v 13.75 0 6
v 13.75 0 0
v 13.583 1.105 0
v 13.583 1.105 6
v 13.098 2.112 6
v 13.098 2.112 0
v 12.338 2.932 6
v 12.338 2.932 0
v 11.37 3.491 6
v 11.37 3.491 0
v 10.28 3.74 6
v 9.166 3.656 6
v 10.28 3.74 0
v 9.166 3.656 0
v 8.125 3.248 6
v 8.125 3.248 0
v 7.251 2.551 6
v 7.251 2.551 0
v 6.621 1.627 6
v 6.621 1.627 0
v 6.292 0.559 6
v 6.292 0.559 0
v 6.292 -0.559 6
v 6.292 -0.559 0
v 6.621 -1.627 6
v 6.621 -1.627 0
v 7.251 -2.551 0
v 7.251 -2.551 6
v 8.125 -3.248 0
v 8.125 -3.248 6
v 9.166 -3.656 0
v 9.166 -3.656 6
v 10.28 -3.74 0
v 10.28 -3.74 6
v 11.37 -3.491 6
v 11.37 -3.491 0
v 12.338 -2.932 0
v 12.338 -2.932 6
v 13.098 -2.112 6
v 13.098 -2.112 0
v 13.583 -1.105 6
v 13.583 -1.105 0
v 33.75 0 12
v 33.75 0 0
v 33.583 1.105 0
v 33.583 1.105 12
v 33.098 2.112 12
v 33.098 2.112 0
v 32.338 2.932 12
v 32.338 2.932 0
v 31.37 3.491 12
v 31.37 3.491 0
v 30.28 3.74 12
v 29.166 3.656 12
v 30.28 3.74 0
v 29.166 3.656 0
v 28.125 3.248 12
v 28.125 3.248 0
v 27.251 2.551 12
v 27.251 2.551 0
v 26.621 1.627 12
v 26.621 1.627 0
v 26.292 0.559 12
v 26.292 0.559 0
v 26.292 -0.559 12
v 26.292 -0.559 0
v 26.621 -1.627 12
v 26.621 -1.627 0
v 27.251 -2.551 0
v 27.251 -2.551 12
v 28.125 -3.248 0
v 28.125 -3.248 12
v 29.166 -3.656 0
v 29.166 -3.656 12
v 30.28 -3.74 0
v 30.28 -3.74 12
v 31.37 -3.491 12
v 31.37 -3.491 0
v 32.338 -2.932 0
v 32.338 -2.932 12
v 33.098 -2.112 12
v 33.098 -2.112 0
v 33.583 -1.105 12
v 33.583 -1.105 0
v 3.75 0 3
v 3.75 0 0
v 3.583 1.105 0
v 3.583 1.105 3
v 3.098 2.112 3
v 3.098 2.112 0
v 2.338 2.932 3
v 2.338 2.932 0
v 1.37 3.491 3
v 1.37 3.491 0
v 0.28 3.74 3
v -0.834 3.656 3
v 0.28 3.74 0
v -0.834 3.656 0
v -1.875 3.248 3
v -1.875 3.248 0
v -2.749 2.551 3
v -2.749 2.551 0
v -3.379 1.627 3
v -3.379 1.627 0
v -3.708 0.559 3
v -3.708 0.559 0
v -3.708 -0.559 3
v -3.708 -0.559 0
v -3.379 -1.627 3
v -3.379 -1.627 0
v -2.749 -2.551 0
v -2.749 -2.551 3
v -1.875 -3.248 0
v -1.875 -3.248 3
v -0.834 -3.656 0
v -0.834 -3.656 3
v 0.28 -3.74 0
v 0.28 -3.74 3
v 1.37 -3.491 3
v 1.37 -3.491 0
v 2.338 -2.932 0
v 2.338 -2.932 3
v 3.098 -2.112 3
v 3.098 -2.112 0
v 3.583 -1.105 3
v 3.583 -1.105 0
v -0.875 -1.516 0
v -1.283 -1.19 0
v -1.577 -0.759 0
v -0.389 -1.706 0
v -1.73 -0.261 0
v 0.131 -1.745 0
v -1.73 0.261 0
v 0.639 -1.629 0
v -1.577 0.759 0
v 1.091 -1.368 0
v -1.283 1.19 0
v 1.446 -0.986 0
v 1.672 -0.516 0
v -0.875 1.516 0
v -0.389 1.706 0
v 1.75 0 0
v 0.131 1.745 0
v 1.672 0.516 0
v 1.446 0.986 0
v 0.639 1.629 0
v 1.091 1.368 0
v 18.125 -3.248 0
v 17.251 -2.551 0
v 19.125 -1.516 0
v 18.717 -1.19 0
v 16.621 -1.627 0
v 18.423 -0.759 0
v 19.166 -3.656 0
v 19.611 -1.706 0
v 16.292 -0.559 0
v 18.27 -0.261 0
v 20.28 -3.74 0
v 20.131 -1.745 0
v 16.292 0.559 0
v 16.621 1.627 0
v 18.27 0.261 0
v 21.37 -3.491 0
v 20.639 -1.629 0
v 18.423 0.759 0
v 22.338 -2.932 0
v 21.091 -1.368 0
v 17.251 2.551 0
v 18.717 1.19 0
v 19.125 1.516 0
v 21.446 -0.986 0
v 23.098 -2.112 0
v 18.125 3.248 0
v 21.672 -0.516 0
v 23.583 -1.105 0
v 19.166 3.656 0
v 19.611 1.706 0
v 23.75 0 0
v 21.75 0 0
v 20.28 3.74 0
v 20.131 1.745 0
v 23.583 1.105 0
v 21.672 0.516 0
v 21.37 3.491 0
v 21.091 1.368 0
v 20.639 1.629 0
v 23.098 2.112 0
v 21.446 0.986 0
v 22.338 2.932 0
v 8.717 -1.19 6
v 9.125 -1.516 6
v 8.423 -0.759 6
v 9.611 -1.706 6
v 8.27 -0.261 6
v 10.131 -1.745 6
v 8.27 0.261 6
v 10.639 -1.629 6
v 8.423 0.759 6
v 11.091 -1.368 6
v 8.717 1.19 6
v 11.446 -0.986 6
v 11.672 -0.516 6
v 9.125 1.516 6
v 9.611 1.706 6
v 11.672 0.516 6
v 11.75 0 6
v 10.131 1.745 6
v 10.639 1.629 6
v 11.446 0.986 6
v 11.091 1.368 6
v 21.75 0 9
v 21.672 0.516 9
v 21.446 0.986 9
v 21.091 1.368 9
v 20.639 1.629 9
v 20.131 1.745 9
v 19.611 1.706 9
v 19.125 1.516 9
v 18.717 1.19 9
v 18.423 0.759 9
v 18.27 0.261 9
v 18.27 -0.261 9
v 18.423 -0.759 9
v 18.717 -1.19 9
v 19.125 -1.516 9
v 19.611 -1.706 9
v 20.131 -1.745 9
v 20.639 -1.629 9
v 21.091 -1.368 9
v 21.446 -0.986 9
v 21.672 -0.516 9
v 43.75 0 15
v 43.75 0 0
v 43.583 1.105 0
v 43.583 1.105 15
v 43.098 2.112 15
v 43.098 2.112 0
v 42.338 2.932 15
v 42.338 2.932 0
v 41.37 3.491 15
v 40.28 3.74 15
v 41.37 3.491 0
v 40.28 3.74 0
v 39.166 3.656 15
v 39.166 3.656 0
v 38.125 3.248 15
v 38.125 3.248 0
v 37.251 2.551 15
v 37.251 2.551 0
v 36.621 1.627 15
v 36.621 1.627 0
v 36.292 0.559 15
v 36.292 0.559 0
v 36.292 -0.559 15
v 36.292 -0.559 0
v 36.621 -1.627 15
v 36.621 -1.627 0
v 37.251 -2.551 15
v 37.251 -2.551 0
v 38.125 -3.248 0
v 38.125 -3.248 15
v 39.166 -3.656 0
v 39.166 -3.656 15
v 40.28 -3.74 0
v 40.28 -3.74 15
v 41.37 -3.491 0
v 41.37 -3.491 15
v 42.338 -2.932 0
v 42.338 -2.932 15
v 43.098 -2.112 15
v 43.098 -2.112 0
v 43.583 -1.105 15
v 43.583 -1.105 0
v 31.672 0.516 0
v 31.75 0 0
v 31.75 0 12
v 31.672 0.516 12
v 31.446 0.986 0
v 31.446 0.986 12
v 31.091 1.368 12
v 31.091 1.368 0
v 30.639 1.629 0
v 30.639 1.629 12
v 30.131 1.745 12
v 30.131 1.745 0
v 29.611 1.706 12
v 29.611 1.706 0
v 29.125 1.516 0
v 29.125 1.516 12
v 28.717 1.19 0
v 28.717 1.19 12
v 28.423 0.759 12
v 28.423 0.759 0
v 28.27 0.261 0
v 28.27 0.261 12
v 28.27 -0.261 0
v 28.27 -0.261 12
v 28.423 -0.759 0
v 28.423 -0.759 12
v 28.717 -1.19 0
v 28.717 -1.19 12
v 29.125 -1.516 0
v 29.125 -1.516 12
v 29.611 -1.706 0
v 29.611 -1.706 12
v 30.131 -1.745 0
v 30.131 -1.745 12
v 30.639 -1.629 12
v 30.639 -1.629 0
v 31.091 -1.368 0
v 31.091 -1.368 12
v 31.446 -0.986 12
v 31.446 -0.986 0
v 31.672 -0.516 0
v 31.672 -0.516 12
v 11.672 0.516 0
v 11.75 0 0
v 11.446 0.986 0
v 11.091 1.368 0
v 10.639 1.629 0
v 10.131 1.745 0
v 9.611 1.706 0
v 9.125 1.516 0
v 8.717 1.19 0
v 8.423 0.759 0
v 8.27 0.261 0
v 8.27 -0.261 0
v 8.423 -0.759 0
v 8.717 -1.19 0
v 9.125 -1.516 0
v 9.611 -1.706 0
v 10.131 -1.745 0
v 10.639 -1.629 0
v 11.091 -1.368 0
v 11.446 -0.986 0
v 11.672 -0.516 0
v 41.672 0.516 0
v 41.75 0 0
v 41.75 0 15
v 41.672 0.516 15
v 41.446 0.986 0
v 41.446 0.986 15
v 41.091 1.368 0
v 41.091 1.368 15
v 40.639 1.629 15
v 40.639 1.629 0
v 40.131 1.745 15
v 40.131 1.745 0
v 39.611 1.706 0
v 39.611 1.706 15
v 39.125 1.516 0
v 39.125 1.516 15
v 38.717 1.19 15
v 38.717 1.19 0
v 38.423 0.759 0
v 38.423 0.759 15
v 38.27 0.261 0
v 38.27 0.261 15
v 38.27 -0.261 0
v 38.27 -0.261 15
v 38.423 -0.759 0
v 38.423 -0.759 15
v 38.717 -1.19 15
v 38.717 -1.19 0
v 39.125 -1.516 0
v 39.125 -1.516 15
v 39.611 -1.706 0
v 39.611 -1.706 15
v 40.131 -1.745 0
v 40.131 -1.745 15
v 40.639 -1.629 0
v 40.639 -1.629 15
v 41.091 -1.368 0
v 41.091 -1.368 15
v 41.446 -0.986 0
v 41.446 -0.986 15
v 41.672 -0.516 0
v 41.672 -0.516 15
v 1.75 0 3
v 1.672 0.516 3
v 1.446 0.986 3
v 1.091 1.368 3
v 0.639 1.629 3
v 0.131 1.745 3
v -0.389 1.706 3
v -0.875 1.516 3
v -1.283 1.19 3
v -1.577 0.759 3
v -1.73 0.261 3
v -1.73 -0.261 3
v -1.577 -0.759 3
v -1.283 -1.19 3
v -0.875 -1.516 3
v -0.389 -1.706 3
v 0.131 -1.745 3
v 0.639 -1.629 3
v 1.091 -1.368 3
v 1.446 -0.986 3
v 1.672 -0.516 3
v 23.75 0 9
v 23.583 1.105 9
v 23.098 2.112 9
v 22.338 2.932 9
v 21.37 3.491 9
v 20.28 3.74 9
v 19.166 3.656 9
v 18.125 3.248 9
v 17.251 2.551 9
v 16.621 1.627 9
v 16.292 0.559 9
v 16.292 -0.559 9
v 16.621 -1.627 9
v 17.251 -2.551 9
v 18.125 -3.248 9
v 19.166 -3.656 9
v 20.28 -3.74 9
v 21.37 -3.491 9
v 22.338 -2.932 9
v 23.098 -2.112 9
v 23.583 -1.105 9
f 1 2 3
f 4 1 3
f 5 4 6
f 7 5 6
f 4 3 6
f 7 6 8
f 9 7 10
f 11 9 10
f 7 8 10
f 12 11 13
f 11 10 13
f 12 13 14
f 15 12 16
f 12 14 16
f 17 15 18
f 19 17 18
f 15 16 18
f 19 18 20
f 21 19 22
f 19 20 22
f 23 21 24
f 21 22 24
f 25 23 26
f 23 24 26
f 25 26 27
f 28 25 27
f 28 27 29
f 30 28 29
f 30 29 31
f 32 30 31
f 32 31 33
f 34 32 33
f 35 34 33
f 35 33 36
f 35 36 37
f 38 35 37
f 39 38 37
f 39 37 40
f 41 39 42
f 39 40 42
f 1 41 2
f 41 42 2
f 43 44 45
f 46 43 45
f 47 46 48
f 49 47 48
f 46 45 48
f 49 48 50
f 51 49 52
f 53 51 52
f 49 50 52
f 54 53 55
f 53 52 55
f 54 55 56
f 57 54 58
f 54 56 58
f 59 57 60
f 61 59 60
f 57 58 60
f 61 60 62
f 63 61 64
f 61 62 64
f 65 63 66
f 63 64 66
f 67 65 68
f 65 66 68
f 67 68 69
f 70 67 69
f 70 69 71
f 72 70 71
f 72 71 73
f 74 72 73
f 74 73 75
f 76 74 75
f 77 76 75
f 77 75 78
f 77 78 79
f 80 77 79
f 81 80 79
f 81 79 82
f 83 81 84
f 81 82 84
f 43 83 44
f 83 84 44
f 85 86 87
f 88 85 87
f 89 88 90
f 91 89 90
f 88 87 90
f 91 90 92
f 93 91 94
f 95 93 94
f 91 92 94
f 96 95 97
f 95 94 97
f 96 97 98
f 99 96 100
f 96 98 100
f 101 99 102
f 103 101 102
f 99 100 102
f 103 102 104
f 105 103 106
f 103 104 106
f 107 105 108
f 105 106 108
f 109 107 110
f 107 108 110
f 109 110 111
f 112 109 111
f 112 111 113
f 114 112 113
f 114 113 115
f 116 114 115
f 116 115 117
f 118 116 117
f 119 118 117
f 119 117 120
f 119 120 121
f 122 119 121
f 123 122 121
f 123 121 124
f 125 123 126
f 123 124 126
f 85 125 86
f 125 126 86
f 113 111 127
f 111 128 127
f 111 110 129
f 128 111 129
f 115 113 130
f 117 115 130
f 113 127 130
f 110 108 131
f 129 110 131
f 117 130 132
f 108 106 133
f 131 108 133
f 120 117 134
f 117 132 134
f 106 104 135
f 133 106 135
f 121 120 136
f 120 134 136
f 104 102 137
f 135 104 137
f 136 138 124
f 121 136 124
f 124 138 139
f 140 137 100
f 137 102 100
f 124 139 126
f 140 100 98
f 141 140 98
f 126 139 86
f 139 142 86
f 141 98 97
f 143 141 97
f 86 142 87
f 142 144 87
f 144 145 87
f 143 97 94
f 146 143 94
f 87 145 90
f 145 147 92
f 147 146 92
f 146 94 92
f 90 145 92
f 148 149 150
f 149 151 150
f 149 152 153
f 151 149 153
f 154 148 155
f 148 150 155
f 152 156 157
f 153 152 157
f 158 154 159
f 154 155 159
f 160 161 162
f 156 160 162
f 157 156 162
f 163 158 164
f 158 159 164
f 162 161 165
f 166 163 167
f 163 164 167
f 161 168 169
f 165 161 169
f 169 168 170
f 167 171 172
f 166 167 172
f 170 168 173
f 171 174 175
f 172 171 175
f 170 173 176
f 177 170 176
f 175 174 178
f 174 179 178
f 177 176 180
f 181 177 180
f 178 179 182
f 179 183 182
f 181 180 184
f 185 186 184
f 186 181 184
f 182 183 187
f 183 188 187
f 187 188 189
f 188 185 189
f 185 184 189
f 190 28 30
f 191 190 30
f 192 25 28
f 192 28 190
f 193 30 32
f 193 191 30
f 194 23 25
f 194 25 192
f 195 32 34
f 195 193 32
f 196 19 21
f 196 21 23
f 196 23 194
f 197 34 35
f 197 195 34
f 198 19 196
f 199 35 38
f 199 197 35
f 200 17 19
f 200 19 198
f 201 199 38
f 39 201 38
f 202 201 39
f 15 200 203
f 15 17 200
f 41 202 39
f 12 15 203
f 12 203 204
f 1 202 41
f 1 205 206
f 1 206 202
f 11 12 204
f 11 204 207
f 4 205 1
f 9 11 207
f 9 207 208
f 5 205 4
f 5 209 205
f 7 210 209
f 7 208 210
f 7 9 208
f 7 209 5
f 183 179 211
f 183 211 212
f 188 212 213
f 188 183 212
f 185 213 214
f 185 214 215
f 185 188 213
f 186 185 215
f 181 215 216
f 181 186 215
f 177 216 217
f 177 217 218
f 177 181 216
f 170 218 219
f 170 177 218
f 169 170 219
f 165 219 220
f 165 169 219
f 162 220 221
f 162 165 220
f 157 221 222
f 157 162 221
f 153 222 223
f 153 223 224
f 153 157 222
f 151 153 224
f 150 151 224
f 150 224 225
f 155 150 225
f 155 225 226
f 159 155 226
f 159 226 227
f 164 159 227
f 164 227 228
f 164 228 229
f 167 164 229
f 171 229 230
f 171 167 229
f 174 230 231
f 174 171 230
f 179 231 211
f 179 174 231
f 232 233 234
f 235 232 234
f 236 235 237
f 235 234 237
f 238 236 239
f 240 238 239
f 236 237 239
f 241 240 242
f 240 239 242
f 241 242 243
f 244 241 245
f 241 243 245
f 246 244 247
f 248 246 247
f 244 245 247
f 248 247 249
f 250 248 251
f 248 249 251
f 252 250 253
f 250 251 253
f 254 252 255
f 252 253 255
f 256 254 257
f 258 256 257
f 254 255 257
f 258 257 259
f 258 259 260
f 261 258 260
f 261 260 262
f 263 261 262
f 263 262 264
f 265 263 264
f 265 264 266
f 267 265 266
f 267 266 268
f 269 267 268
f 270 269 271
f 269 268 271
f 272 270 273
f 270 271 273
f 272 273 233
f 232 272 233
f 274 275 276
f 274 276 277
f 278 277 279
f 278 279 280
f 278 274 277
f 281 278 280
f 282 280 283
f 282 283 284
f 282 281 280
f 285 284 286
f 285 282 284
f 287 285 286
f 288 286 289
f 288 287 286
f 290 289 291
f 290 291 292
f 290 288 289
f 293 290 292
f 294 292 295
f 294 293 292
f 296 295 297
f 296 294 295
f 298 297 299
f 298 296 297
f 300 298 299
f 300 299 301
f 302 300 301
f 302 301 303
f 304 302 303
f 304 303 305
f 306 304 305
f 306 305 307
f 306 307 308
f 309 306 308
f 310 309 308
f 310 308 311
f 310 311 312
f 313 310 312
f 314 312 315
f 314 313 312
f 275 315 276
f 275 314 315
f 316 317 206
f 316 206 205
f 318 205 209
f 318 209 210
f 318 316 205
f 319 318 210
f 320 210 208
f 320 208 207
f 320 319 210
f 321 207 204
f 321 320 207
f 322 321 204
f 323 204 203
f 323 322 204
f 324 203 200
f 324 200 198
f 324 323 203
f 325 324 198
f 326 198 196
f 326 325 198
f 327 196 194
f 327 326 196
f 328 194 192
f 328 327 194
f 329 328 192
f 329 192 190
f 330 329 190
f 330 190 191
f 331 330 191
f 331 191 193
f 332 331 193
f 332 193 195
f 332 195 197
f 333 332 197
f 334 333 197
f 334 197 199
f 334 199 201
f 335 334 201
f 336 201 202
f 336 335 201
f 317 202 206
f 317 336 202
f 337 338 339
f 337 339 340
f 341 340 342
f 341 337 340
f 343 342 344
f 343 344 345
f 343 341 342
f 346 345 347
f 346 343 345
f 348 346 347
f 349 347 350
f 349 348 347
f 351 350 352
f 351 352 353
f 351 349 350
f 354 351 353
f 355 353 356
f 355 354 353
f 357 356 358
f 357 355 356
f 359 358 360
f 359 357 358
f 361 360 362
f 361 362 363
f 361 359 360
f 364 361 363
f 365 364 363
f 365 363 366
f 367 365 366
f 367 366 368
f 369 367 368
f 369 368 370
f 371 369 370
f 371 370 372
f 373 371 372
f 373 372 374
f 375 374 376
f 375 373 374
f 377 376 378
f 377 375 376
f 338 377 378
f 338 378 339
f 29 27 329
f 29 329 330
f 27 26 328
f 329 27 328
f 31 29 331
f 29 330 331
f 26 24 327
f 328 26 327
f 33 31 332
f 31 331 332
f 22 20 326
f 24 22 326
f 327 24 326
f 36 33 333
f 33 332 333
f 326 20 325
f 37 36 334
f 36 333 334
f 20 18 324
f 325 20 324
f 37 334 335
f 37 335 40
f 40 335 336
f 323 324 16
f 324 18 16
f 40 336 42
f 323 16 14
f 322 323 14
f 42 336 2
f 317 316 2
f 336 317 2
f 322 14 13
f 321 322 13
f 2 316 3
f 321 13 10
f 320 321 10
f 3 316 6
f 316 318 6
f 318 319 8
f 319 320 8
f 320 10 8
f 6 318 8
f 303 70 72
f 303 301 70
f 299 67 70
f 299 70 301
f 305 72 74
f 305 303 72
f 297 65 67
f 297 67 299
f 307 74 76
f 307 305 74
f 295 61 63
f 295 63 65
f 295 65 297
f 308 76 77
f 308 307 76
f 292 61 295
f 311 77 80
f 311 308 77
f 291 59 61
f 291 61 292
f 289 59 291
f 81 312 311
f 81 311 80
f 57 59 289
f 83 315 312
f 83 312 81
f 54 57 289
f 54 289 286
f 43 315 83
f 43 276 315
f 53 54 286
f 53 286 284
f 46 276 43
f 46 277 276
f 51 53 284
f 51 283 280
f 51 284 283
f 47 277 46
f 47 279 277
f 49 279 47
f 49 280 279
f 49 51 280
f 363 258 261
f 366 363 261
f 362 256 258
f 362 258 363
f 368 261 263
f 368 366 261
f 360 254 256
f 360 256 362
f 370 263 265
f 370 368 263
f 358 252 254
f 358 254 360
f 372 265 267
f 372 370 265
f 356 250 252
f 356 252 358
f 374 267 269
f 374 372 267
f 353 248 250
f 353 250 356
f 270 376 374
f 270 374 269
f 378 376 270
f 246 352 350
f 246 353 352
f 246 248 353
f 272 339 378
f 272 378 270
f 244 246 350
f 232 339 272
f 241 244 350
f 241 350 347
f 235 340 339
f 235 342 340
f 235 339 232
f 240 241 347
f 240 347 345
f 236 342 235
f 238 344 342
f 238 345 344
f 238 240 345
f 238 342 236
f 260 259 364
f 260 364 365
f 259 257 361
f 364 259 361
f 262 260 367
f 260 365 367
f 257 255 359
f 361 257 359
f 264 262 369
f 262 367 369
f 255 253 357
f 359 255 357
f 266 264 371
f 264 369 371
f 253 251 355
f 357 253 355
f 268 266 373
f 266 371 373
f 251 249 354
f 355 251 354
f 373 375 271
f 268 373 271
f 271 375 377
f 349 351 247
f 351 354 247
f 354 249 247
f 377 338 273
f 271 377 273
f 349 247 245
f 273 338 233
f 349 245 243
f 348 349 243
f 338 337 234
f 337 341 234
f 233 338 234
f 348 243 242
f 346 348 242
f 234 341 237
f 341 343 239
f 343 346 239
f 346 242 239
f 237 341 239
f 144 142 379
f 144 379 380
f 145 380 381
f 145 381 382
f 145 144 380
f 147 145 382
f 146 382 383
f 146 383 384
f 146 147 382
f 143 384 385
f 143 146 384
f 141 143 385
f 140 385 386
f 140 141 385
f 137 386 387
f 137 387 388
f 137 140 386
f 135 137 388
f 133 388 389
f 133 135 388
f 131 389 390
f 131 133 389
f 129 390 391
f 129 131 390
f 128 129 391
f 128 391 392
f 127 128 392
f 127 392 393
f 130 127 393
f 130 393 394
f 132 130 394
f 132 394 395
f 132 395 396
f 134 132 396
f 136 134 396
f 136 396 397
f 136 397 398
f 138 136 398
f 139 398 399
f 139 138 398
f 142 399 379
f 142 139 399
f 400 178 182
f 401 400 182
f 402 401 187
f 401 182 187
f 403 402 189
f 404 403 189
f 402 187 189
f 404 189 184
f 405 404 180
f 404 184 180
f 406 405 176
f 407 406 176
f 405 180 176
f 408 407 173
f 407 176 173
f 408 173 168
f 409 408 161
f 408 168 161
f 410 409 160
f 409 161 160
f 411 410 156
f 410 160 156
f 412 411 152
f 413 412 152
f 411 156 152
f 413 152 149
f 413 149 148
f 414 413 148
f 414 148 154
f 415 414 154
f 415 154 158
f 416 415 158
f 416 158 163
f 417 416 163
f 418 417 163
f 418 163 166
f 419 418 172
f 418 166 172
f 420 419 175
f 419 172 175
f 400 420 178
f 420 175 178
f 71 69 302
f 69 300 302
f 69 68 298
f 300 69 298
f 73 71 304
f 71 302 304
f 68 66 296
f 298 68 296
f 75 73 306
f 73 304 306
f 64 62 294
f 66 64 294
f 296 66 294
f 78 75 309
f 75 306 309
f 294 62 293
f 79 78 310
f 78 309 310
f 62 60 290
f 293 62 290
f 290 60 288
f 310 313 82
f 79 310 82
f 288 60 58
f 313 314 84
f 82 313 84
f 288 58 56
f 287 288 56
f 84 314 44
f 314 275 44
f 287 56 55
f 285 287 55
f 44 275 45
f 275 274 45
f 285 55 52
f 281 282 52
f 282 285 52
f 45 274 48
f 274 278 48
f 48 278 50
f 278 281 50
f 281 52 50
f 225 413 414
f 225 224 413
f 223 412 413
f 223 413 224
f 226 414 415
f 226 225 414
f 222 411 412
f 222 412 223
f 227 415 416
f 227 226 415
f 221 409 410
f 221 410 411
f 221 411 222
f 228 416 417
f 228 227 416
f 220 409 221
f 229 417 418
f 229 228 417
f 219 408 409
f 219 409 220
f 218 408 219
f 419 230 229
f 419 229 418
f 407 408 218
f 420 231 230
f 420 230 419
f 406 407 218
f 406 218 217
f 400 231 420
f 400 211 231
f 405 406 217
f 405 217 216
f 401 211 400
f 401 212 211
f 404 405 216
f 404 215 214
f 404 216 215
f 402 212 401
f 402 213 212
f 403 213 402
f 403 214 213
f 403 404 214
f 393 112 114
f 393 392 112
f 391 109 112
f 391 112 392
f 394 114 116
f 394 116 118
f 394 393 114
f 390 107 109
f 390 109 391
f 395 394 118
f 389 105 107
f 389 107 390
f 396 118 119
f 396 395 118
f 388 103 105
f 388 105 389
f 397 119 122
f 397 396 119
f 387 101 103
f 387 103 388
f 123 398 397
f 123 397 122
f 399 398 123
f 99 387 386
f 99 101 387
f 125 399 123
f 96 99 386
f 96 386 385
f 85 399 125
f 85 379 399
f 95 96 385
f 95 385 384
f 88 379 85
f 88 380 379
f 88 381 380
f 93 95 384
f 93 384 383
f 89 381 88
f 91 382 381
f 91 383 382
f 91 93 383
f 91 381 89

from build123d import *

# Parameters (mm, degrees)
F0_R     = 3.75
F0_R_2   = 1.75
F1_DEPTH = 3
F2_DEPTH = 6
F3_DEPTH = 9
F4_DEPTH = 12
F5_DEPTH = 15


with BuildPart() as f1:
    # F0 (on Top) → F1 (new body)
    with BuildSketch(Plane.XY):
        Circle(F0_R)
        Circle(F0_R_2, mode=Mode.SUBTRACT)
    extrude(amount=F1_DEPTH)


with BuildPart() as f2:
    # F0 (on Top) → F2 (new body)
    with BuildSketch(Plane.XY):
        with Locations((10, 0)):
            Circle(F0_R)
        with Locations((10, 0)):
            Circle(F0_R_2, mode=Mode.SUBTRACT)
    extrude(amount=F2_DEPTH)


with BuildPart() as f3:
    # F0 (on Top) → F3 (new body)
    with BuildSketch(Plane.XY):
        with Locations((20, 0)):
            Circle(F0_R)
        with Locations((20, 0)):
            Circle(F0_R_2, mode=Mode.SUBTRACT)
    extrude(amount=F3_DEPTH)


with BuildPart() as f4:
    # F0 (on Top) → F4 (new body)
    with BuildSketch(Plane.XY):
        with Locations((30, 0)):
            Circle(F0_R)
        with Locations((30, 0)):
            Circle(F0_R_2, mode=Mode.SUBTRACT)
    extrude(amount=F4_DEPTH)


with BuildPart() as f5:
    # F0 (on Top) → F5 (new body)
    with BuildSketch(Plane.XY):
        with Locations((40, 0)):
            Circle(F0_R)
        with Locations((40, 0)):
            Circle(F0_R_2, mode=Mode.SUBTRACT)
    extrude(amount=F5_DEPTH)


solid = Compound([f1.part, f2.part, f3.part, f4.part, f5.part])
